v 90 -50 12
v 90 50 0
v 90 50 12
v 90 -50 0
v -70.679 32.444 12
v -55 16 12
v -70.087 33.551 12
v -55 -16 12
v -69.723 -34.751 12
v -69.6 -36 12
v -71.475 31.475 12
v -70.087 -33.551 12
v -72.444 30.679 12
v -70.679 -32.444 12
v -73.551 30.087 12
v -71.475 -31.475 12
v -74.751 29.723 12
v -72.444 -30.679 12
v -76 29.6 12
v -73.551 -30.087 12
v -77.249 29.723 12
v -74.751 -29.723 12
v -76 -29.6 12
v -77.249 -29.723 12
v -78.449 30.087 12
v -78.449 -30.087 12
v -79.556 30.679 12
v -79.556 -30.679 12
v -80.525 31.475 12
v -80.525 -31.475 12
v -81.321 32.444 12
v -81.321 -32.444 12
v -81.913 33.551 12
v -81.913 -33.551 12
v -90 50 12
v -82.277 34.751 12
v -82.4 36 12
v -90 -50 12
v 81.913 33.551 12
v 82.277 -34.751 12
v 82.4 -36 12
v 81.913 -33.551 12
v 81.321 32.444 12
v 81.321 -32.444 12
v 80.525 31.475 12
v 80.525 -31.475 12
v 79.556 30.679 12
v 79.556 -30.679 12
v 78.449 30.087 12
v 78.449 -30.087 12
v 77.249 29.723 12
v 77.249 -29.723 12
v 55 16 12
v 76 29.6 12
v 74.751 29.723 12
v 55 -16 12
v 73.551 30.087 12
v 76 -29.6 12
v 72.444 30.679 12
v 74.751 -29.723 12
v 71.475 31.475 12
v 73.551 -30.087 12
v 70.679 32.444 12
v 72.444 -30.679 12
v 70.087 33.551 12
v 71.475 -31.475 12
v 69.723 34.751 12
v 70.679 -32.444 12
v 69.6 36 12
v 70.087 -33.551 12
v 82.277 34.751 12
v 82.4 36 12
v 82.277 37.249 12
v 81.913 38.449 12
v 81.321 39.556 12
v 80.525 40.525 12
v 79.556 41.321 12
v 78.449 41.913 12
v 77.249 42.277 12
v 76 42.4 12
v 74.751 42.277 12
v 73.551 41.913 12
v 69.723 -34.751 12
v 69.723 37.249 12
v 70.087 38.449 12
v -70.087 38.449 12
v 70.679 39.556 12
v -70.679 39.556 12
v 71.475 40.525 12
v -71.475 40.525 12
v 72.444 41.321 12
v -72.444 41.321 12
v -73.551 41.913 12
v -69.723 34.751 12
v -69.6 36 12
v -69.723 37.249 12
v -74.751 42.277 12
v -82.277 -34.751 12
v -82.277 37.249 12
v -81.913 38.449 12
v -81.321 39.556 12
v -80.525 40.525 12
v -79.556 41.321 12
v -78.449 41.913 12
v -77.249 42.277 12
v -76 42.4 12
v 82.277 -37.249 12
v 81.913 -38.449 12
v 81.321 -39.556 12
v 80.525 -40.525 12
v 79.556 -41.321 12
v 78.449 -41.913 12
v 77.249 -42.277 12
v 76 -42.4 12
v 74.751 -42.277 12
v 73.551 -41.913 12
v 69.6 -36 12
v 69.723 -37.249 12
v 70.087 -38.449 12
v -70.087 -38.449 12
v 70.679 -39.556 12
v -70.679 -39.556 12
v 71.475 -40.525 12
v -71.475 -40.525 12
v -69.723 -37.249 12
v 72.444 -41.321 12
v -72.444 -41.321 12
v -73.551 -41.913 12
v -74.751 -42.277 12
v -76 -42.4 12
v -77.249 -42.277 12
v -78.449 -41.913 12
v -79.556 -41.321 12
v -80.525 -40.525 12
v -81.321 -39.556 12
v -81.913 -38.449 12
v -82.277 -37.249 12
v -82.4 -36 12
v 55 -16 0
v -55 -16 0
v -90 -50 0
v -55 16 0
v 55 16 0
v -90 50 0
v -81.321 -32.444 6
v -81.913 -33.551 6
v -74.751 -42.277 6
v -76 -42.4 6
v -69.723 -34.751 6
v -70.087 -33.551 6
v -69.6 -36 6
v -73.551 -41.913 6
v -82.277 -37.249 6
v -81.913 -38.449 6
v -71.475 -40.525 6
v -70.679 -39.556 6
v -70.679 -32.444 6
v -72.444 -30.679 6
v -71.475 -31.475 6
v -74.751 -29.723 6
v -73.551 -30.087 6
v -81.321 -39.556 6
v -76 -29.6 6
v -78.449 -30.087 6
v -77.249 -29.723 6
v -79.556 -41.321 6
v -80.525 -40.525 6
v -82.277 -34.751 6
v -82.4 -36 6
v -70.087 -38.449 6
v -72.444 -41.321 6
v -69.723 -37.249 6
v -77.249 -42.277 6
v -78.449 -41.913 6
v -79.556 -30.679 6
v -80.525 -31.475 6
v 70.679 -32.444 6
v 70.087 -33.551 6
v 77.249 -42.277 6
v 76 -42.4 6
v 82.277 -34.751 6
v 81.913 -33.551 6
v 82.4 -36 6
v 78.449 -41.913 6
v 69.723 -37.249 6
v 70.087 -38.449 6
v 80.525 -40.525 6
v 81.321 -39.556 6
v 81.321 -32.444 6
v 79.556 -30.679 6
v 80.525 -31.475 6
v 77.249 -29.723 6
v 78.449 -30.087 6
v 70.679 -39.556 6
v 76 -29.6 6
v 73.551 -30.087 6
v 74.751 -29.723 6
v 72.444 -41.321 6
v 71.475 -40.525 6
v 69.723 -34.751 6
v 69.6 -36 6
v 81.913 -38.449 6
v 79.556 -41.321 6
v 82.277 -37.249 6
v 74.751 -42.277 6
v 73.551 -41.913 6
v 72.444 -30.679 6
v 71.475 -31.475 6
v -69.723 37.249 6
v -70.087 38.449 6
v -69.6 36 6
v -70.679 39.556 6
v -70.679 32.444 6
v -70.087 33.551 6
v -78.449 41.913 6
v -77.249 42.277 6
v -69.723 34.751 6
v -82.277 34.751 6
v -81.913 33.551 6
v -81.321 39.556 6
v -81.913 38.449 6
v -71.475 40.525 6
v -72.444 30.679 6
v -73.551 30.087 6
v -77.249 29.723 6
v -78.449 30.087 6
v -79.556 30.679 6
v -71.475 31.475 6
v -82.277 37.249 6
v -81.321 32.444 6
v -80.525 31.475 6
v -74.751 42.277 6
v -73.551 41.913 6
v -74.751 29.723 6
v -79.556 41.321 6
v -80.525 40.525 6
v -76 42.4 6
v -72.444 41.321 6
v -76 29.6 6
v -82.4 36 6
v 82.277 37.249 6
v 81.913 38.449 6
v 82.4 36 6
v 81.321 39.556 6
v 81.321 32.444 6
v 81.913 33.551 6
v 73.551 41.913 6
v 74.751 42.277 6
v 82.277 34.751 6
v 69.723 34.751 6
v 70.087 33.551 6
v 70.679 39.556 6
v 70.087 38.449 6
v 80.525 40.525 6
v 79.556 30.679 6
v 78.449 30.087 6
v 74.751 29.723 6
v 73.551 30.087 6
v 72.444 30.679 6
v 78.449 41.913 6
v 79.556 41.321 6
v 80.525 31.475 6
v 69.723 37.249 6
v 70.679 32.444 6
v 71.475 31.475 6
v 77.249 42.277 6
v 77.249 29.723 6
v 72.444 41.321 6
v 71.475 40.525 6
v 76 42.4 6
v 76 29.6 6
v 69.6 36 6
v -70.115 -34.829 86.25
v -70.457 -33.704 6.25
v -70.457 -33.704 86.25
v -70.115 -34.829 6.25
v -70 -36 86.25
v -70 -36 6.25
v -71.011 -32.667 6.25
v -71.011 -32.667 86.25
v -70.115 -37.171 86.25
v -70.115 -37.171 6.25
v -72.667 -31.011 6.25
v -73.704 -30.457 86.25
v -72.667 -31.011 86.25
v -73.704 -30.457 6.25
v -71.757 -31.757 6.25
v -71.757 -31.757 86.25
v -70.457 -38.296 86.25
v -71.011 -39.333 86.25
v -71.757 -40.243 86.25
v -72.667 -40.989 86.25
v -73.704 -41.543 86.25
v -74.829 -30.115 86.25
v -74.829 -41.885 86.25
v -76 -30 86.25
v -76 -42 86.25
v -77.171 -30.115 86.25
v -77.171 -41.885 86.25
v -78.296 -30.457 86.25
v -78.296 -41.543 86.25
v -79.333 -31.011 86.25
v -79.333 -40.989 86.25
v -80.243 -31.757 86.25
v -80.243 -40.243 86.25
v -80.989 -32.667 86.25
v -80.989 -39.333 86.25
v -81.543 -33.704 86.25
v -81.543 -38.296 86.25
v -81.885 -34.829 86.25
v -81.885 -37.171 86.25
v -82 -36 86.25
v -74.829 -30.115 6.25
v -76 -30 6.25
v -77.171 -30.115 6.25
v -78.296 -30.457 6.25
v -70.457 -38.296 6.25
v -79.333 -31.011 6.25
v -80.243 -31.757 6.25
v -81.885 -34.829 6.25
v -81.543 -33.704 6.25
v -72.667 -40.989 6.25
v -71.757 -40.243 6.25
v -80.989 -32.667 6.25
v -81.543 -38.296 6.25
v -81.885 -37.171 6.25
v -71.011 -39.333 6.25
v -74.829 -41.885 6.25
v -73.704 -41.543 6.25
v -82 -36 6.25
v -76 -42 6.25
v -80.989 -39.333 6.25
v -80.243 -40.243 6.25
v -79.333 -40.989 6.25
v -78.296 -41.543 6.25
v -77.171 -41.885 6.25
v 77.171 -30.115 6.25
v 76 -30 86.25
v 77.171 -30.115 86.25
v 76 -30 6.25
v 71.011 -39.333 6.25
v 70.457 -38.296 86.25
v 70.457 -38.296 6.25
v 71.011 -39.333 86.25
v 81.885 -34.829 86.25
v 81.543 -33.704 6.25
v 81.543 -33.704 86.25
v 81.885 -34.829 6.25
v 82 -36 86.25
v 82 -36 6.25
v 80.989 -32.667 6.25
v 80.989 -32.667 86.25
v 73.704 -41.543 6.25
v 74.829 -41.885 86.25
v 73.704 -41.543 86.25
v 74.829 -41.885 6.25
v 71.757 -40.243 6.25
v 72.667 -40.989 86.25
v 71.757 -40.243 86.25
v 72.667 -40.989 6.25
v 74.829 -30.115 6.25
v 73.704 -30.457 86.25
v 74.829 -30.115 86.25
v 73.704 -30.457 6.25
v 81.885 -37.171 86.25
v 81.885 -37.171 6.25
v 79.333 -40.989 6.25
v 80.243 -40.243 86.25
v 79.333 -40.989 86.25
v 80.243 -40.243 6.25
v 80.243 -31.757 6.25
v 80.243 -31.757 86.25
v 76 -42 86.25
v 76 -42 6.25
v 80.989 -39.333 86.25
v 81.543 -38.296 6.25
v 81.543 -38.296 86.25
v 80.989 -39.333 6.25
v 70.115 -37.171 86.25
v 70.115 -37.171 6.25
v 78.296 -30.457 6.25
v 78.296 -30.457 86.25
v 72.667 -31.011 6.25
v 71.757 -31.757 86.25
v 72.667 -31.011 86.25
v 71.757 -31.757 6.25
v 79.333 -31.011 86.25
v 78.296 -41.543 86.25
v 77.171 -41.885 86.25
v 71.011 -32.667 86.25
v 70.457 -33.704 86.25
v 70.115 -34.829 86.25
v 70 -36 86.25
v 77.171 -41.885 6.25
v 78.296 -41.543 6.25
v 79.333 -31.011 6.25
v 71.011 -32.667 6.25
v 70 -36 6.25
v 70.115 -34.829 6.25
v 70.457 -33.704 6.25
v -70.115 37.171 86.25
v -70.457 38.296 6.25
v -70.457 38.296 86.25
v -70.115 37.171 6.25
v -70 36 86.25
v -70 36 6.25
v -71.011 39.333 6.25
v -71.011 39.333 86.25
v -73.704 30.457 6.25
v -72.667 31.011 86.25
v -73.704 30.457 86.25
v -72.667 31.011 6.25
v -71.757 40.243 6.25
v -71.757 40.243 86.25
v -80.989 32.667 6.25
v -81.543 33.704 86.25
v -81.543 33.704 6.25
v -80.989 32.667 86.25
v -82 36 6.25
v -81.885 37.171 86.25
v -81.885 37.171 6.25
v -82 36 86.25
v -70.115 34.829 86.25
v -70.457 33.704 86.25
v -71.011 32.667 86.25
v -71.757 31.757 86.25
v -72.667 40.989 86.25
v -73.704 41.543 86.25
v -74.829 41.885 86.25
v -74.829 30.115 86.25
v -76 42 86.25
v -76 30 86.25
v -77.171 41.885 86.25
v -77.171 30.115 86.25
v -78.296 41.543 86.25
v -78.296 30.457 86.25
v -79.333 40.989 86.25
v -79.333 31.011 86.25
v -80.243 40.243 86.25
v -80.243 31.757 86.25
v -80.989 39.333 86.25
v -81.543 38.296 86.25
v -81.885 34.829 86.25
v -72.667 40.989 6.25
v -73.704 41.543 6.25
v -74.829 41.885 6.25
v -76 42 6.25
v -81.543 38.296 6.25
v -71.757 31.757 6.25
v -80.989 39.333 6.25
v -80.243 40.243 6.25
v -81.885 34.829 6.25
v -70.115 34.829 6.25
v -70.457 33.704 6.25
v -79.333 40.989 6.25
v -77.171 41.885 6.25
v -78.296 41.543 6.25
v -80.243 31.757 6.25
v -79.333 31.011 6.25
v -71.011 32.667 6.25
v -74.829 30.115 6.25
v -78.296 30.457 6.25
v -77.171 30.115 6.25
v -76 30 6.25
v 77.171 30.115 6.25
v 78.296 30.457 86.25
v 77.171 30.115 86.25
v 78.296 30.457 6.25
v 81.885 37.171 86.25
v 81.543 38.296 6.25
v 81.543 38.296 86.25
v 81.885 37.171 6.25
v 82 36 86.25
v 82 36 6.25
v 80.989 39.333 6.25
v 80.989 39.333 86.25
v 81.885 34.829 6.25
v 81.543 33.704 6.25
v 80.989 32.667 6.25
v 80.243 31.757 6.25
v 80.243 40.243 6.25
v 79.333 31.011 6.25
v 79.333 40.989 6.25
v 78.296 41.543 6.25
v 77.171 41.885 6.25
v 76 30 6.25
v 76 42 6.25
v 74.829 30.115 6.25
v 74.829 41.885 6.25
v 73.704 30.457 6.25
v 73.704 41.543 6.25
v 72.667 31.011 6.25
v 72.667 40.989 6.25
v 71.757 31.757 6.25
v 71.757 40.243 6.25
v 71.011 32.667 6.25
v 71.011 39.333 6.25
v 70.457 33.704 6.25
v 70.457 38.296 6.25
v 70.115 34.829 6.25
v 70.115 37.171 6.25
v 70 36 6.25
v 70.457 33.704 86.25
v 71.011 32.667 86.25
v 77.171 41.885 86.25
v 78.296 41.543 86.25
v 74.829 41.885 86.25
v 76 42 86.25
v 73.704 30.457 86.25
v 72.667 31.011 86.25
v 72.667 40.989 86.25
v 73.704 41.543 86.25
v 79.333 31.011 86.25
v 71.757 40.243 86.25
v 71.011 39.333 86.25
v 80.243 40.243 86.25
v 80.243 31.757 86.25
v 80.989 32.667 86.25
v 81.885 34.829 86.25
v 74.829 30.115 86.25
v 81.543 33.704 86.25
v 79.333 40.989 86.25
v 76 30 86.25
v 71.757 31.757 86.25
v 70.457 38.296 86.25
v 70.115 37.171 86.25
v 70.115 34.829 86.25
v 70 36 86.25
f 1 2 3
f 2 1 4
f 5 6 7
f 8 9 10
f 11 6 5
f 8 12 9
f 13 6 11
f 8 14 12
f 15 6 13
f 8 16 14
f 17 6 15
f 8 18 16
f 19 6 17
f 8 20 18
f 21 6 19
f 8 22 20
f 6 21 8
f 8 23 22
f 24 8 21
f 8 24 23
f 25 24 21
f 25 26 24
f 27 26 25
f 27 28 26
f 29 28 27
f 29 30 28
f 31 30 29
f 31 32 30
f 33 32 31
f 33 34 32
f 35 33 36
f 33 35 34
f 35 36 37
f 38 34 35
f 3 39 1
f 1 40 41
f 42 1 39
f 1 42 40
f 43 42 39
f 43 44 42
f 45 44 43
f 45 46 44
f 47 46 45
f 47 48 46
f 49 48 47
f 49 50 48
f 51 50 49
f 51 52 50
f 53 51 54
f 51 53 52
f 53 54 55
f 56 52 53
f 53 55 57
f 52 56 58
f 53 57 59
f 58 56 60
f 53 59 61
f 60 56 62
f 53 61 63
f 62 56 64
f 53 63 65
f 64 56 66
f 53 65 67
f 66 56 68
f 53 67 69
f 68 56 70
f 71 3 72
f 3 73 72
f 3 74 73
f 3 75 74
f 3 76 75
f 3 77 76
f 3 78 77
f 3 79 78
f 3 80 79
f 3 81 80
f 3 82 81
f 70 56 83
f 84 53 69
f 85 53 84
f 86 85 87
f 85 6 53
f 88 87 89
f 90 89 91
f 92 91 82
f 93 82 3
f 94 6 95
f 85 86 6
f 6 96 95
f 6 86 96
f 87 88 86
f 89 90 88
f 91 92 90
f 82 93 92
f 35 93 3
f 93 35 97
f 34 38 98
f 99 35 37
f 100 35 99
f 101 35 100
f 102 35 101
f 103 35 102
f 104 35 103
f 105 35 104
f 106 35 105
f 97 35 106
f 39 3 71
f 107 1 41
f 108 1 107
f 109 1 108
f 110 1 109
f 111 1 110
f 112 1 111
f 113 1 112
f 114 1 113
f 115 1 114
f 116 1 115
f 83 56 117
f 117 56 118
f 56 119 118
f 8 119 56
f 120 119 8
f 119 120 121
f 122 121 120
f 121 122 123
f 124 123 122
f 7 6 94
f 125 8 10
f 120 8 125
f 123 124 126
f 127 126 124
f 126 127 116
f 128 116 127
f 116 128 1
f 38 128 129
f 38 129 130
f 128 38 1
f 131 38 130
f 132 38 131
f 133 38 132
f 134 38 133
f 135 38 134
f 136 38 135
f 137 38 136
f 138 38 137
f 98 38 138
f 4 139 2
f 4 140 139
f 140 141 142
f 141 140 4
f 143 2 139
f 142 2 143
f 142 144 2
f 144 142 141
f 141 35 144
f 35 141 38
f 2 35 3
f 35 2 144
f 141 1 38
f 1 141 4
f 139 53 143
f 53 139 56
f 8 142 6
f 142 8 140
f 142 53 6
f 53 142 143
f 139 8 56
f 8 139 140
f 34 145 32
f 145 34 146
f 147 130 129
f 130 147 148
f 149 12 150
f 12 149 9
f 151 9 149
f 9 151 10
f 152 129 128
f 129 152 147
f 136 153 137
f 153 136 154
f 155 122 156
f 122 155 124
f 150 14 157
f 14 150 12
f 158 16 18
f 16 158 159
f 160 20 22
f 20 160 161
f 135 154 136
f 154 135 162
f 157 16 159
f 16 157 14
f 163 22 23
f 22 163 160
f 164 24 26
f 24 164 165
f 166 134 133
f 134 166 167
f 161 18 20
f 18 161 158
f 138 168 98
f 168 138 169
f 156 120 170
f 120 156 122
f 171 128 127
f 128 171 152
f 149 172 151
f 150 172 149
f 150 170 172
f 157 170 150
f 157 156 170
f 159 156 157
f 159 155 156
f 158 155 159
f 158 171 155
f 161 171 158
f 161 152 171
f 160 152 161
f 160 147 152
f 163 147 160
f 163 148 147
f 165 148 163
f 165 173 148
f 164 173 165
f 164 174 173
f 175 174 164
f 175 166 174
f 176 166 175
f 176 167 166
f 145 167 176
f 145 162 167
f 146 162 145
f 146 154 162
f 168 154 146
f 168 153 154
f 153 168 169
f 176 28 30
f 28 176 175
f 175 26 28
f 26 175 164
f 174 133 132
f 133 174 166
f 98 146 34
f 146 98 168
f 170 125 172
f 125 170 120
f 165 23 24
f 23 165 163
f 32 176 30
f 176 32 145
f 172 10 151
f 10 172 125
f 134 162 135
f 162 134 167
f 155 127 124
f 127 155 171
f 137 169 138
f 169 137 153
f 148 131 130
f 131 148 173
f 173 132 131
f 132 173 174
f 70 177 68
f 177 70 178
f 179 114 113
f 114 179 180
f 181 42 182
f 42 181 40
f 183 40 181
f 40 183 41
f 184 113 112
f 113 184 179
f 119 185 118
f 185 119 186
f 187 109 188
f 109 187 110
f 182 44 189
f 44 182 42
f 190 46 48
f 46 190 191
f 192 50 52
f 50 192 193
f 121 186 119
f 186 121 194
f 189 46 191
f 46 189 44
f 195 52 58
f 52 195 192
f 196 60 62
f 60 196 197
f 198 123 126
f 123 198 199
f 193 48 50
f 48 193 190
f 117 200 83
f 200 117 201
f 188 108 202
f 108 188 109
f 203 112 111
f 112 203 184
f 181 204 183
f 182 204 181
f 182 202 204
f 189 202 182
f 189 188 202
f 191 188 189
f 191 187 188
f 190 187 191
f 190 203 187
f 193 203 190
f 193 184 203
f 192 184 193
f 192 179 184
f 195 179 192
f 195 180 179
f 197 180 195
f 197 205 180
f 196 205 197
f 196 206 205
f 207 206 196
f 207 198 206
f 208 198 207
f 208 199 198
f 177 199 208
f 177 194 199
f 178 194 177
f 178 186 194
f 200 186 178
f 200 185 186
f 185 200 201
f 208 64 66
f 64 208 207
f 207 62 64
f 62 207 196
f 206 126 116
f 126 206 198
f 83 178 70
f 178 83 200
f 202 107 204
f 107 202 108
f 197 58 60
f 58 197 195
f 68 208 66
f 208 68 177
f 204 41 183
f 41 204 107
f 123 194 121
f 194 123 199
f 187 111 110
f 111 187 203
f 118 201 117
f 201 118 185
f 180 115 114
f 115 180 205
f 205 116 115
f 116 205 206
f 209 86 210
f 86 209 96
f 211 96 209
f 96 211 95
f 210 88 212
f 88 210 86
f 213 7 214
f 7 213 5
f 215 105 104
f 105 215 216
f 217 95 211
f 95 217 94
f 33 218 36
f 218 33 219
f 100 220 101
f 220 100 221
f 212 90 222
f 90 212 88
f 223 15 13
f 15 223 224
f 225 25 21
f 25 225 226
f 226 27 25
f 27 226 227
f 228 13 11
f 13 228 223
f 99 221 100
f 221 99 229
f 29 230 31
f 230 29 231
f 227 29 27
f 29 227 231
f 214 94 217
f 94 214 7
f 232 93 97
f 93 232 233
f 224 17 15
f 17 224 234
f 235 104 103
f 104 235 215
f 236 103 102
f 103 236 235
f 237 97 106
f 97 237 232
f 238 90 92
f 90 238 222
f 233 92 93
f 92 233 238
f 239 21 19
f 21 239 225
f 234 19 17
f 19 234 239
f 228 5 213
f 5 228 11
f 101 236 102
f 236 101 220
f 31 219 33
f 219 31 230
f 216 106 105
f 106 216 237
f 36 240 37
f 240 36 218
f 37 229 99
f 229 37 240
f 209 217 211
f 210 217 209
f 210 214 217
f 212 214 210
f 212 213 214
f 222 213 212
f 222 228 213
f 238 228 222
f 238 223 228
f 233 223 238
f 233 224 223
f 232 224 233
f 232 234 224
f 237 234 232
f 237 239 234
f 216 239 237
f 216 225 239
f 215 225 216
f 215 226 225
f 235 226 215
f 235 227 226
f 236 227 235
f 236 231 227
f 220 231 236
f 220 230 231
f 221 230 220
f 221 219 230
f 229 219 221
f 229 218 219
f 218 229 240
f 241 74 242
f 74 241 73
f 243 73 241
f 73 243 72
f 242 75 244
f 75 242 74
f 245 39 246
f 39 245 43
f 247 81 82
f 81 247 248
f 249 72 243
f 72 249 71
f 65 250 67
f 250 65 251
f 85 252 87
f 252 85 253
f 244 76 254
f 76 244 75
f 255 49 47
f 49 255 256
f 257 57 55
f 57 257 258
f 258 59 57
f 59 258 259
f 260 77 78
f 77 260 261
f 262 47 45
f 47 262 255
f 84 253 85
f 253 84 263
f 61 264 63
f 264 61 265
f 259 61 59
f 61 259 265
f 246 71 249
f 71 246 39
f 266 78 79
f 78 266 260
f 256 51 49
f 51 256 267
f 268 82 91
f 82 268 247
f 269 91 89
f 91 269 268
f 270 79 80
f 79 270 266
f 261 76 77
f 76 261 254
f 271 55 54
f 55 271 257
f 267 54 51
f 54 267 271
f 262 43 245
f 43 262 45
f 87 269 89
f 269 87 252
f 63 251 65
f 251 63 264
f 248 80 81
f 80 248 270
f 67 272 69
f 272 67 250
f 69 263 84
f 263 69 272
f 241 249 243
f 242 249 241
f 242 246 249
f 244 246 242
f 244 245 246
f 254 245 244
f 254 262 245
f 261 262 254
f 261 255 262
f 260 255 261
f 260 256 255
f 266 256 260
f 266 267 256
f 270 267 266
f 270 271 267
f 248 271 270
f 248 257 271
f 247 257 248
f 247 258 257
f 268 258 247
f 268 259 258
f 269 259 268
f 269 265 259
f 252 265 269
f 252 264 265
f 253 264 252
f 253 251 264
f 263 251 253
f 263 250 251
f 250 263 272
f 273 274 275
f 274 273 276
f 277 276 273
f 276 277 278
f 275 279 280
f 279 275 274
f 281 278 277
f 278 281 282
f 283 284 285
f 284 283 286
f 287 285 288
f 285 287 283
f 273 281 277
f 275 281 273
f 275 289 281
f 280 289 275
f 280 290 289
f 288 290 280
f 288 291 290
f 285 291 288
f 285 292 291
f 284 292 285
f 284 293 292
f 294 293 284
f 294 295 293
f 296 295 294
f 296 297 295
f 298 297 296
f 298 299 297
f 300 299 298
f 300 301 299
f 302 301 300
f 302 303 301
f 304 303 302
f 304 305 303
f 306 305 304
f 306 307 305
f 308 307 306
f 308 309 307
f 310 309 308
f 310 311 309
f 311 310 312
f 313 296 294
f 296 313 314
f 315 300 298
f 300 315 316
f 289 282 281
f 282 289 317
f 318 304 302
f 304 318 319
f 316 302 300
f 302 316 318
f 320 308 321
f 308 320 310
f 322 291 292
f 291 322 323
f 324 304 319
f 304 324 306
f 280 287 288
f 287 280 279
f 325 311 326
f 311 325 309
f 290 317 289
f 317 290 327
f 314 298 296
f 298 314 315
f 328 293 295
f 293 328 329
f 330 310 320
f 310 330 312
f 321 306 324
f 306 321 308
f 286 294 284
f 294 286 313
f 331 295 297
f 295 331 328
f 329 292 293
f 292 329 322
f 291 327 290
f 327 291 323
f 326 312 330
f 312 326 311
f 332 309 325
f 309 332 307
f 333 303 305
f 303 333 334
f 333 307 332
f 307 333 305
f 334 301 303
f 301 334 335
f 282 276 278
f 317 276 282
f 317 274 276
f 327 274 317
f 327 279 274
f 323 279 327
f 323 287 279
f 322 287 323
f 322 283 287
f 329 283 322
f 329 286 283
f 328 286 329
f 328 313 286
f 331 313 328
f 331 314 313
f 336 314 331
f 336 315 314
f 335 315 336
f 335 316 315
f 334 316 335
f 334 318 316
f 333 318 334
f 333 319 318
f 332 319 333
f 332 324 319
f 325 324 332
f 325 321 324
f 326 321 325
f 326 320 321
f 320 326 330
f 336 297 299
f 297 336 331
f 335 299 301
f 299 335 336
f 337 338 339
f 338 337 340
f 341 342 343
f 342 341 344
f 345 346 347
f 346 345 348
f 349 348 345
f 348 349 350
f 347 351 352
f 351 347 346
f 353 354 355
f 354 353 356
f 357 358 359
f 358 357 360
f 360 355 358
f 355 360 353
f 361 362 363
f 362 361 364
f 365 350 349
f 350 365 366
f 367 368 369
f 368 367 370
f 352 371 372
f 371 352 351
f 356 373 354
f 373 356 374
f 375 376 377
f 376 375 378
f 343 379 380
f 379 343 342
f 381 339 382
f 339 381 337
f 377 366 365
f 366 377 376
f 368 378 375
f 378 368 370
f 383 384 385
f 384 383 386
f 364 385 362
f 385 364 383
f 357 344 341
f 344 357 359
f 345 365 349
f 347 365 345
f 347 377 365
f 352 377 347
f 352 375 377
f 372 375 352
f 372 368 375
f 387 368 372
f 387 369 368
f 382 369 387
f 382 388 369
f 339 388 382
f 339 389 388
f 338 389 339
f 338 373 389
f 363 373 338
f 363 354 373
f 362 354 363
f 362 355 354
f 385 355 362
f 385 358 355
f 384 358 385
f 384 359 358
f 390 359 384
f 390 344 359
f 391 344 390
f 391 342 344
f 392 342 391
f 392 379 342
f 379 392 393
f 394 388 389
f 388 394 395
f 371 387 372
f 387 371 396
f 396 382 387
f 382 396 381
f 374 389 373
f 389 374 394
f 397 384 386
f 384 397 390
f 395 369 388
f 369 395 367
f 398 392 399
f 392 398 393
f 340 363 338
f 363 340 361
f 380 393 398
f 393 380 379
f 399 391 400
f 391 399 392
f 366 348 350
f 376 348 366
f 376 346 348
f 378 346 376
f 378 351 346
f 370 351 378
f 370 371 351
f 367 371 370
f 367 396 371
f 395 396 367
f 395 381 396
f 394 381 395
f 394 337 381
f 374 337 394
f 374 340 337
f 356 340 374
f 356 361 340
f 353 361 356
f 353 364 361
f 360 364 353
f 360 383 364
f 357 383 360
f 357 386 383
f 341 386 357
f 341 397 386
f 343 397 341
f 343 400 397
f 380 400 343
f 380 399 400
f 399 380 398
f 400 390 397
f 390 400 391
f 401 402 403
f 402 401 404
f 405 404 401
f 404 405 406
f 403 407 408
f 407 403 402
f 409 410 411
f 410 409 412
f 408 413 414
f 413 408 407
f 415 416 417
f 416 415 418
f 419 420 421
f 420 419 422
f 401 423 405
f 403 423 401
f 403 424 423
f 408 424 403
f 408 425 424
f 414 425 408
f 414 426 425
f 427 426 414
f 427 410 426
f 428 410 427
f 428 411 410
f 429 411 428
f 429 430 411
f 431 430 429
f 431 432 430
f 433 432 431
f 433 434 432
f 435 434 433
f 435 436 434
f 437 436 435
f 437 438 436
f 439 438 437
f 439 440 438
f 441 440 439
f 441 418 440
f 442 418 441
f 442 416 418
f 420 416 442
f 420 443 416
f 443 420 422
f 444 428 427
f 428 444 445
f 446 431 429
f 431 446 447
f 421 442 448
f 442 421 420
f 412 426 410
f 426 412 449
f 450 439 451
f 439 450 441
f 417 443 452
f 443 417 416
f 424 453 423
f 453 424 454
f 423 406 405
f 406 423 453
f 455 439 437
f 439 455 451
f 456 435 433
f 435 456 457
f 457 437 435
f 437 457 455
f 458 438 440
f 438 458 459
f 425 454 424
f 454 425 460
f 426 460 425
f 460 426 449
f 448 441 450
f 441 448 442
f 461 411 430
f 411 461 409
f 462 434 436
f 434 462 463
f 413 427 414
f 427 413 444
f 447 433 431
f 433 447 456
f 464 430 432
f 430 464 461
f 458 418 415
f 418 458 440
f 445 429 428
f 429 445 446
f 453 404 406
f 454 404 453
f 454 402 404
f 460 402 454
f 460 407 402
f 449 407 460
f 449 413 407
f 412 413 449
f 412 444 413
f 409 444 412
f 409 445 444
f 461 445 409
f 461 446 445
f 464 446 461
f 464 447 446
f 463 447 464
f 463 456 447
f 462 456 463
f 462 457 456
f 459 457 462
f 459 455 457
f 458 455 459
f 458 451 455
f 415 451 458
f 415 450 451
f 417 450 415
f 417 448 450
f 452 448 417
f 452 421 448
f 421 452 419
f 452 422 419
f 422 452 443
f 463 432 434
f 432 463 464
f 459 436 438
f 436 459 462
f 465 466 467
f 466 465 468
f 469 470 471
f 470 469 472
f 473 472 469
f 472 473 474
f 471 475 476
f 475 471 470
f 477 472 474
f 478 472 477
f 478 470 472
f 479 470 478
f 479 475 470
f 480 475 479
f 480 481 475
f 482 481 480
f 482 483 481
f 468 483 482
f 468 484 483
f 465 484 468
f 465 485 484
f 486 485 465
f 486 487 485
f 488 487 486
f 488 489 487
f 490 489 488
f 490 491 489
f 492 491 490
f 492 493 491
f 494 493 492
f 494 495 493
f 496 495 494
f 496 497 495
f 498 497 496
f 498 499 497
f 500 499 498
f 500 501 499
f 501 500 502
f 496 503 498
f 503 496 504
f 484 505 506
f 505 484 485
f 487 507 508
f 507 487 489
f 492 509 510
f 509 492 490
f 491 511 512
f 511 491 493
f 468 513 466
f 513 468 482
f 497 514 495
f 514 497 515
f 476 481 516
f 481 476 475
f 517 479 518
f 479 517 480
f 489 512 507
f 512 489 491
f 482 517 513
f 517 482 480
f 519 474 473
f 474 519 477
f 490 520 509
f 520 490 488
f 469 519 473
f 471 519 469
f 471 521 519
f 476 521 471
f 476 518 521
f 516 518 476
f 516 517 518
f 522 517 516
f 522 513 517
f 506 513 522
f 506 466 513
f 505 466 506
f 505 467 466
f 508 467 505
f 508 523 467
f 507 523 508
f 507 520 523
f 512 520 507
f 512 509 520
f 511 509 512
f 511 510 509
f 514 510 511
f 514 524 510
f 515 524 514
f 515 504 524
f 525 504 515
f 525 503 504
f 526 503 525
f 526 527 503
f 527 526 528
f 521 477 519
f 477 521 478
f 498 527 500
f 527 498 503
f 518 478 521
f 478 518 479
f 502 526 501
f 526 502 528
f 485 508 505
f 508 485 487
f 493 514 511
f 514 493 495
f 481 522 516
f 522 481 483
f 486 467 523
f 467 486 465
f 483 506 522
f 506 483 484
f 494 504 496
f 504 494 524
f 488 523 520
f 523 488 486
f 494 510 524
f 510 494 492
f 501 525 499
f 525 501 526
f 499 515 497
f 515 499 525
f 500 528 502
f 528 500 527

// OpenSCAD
$fn = 32;

// ------------------------------------------------------------------------
// Frame with four posts: 180 x 100 mm frame, four d12 posts
// Every part is its own module, assembly() places them once.
// ------------------------------------------------------------------------

// --- part 1 ---
module base_frame() {
  difference() {
    translate([-90, -50, 0]) cube([180, 100, 12]);
    translate([-55, -16, -1]) cube([110, 32, 14]);
    translate([-76, -36, 6]) cylinder(h = 7, d = 12.8);
    translate([76, -36, 6]) cylinder(h = 7, d = 12.8);
    translate([-76, 36, 6]) cylinder(h = 7, d = 12.8);
    translate([76, 36, 6]) cylinder(h = 7, d = 12.8);
  }
}

// --- part 2 ---
module post1() {
  cylinder(h = 80, d = 12);
}

// --- part 3 ---
module post2() {
  cylinder(h = 80, d = 12);
}

// --- part 4 ---
module post3() {
  cylinder(h = 80, d = 12);
}

// --- part 5 ---
module post4() {
  cylinder(h = 80, d = 12);
}

// --- assembly ---
module assembly() {
  translate([0, 0, 0]) rotate([0, 0, 0]) base_frame();
  translate([-76, -36, 6.25]) rotate([0, 0, 0]) post1();
  translate([76, -36, 6.25]) rotate([0, 0, 0]) post2();
  translate([-76, 36, 6.25]) rotate([0, 0, 0]) post3();
  translate([76, 36, 6.25]) rotate([0, 0, 0]) post4();
}

assembly();
